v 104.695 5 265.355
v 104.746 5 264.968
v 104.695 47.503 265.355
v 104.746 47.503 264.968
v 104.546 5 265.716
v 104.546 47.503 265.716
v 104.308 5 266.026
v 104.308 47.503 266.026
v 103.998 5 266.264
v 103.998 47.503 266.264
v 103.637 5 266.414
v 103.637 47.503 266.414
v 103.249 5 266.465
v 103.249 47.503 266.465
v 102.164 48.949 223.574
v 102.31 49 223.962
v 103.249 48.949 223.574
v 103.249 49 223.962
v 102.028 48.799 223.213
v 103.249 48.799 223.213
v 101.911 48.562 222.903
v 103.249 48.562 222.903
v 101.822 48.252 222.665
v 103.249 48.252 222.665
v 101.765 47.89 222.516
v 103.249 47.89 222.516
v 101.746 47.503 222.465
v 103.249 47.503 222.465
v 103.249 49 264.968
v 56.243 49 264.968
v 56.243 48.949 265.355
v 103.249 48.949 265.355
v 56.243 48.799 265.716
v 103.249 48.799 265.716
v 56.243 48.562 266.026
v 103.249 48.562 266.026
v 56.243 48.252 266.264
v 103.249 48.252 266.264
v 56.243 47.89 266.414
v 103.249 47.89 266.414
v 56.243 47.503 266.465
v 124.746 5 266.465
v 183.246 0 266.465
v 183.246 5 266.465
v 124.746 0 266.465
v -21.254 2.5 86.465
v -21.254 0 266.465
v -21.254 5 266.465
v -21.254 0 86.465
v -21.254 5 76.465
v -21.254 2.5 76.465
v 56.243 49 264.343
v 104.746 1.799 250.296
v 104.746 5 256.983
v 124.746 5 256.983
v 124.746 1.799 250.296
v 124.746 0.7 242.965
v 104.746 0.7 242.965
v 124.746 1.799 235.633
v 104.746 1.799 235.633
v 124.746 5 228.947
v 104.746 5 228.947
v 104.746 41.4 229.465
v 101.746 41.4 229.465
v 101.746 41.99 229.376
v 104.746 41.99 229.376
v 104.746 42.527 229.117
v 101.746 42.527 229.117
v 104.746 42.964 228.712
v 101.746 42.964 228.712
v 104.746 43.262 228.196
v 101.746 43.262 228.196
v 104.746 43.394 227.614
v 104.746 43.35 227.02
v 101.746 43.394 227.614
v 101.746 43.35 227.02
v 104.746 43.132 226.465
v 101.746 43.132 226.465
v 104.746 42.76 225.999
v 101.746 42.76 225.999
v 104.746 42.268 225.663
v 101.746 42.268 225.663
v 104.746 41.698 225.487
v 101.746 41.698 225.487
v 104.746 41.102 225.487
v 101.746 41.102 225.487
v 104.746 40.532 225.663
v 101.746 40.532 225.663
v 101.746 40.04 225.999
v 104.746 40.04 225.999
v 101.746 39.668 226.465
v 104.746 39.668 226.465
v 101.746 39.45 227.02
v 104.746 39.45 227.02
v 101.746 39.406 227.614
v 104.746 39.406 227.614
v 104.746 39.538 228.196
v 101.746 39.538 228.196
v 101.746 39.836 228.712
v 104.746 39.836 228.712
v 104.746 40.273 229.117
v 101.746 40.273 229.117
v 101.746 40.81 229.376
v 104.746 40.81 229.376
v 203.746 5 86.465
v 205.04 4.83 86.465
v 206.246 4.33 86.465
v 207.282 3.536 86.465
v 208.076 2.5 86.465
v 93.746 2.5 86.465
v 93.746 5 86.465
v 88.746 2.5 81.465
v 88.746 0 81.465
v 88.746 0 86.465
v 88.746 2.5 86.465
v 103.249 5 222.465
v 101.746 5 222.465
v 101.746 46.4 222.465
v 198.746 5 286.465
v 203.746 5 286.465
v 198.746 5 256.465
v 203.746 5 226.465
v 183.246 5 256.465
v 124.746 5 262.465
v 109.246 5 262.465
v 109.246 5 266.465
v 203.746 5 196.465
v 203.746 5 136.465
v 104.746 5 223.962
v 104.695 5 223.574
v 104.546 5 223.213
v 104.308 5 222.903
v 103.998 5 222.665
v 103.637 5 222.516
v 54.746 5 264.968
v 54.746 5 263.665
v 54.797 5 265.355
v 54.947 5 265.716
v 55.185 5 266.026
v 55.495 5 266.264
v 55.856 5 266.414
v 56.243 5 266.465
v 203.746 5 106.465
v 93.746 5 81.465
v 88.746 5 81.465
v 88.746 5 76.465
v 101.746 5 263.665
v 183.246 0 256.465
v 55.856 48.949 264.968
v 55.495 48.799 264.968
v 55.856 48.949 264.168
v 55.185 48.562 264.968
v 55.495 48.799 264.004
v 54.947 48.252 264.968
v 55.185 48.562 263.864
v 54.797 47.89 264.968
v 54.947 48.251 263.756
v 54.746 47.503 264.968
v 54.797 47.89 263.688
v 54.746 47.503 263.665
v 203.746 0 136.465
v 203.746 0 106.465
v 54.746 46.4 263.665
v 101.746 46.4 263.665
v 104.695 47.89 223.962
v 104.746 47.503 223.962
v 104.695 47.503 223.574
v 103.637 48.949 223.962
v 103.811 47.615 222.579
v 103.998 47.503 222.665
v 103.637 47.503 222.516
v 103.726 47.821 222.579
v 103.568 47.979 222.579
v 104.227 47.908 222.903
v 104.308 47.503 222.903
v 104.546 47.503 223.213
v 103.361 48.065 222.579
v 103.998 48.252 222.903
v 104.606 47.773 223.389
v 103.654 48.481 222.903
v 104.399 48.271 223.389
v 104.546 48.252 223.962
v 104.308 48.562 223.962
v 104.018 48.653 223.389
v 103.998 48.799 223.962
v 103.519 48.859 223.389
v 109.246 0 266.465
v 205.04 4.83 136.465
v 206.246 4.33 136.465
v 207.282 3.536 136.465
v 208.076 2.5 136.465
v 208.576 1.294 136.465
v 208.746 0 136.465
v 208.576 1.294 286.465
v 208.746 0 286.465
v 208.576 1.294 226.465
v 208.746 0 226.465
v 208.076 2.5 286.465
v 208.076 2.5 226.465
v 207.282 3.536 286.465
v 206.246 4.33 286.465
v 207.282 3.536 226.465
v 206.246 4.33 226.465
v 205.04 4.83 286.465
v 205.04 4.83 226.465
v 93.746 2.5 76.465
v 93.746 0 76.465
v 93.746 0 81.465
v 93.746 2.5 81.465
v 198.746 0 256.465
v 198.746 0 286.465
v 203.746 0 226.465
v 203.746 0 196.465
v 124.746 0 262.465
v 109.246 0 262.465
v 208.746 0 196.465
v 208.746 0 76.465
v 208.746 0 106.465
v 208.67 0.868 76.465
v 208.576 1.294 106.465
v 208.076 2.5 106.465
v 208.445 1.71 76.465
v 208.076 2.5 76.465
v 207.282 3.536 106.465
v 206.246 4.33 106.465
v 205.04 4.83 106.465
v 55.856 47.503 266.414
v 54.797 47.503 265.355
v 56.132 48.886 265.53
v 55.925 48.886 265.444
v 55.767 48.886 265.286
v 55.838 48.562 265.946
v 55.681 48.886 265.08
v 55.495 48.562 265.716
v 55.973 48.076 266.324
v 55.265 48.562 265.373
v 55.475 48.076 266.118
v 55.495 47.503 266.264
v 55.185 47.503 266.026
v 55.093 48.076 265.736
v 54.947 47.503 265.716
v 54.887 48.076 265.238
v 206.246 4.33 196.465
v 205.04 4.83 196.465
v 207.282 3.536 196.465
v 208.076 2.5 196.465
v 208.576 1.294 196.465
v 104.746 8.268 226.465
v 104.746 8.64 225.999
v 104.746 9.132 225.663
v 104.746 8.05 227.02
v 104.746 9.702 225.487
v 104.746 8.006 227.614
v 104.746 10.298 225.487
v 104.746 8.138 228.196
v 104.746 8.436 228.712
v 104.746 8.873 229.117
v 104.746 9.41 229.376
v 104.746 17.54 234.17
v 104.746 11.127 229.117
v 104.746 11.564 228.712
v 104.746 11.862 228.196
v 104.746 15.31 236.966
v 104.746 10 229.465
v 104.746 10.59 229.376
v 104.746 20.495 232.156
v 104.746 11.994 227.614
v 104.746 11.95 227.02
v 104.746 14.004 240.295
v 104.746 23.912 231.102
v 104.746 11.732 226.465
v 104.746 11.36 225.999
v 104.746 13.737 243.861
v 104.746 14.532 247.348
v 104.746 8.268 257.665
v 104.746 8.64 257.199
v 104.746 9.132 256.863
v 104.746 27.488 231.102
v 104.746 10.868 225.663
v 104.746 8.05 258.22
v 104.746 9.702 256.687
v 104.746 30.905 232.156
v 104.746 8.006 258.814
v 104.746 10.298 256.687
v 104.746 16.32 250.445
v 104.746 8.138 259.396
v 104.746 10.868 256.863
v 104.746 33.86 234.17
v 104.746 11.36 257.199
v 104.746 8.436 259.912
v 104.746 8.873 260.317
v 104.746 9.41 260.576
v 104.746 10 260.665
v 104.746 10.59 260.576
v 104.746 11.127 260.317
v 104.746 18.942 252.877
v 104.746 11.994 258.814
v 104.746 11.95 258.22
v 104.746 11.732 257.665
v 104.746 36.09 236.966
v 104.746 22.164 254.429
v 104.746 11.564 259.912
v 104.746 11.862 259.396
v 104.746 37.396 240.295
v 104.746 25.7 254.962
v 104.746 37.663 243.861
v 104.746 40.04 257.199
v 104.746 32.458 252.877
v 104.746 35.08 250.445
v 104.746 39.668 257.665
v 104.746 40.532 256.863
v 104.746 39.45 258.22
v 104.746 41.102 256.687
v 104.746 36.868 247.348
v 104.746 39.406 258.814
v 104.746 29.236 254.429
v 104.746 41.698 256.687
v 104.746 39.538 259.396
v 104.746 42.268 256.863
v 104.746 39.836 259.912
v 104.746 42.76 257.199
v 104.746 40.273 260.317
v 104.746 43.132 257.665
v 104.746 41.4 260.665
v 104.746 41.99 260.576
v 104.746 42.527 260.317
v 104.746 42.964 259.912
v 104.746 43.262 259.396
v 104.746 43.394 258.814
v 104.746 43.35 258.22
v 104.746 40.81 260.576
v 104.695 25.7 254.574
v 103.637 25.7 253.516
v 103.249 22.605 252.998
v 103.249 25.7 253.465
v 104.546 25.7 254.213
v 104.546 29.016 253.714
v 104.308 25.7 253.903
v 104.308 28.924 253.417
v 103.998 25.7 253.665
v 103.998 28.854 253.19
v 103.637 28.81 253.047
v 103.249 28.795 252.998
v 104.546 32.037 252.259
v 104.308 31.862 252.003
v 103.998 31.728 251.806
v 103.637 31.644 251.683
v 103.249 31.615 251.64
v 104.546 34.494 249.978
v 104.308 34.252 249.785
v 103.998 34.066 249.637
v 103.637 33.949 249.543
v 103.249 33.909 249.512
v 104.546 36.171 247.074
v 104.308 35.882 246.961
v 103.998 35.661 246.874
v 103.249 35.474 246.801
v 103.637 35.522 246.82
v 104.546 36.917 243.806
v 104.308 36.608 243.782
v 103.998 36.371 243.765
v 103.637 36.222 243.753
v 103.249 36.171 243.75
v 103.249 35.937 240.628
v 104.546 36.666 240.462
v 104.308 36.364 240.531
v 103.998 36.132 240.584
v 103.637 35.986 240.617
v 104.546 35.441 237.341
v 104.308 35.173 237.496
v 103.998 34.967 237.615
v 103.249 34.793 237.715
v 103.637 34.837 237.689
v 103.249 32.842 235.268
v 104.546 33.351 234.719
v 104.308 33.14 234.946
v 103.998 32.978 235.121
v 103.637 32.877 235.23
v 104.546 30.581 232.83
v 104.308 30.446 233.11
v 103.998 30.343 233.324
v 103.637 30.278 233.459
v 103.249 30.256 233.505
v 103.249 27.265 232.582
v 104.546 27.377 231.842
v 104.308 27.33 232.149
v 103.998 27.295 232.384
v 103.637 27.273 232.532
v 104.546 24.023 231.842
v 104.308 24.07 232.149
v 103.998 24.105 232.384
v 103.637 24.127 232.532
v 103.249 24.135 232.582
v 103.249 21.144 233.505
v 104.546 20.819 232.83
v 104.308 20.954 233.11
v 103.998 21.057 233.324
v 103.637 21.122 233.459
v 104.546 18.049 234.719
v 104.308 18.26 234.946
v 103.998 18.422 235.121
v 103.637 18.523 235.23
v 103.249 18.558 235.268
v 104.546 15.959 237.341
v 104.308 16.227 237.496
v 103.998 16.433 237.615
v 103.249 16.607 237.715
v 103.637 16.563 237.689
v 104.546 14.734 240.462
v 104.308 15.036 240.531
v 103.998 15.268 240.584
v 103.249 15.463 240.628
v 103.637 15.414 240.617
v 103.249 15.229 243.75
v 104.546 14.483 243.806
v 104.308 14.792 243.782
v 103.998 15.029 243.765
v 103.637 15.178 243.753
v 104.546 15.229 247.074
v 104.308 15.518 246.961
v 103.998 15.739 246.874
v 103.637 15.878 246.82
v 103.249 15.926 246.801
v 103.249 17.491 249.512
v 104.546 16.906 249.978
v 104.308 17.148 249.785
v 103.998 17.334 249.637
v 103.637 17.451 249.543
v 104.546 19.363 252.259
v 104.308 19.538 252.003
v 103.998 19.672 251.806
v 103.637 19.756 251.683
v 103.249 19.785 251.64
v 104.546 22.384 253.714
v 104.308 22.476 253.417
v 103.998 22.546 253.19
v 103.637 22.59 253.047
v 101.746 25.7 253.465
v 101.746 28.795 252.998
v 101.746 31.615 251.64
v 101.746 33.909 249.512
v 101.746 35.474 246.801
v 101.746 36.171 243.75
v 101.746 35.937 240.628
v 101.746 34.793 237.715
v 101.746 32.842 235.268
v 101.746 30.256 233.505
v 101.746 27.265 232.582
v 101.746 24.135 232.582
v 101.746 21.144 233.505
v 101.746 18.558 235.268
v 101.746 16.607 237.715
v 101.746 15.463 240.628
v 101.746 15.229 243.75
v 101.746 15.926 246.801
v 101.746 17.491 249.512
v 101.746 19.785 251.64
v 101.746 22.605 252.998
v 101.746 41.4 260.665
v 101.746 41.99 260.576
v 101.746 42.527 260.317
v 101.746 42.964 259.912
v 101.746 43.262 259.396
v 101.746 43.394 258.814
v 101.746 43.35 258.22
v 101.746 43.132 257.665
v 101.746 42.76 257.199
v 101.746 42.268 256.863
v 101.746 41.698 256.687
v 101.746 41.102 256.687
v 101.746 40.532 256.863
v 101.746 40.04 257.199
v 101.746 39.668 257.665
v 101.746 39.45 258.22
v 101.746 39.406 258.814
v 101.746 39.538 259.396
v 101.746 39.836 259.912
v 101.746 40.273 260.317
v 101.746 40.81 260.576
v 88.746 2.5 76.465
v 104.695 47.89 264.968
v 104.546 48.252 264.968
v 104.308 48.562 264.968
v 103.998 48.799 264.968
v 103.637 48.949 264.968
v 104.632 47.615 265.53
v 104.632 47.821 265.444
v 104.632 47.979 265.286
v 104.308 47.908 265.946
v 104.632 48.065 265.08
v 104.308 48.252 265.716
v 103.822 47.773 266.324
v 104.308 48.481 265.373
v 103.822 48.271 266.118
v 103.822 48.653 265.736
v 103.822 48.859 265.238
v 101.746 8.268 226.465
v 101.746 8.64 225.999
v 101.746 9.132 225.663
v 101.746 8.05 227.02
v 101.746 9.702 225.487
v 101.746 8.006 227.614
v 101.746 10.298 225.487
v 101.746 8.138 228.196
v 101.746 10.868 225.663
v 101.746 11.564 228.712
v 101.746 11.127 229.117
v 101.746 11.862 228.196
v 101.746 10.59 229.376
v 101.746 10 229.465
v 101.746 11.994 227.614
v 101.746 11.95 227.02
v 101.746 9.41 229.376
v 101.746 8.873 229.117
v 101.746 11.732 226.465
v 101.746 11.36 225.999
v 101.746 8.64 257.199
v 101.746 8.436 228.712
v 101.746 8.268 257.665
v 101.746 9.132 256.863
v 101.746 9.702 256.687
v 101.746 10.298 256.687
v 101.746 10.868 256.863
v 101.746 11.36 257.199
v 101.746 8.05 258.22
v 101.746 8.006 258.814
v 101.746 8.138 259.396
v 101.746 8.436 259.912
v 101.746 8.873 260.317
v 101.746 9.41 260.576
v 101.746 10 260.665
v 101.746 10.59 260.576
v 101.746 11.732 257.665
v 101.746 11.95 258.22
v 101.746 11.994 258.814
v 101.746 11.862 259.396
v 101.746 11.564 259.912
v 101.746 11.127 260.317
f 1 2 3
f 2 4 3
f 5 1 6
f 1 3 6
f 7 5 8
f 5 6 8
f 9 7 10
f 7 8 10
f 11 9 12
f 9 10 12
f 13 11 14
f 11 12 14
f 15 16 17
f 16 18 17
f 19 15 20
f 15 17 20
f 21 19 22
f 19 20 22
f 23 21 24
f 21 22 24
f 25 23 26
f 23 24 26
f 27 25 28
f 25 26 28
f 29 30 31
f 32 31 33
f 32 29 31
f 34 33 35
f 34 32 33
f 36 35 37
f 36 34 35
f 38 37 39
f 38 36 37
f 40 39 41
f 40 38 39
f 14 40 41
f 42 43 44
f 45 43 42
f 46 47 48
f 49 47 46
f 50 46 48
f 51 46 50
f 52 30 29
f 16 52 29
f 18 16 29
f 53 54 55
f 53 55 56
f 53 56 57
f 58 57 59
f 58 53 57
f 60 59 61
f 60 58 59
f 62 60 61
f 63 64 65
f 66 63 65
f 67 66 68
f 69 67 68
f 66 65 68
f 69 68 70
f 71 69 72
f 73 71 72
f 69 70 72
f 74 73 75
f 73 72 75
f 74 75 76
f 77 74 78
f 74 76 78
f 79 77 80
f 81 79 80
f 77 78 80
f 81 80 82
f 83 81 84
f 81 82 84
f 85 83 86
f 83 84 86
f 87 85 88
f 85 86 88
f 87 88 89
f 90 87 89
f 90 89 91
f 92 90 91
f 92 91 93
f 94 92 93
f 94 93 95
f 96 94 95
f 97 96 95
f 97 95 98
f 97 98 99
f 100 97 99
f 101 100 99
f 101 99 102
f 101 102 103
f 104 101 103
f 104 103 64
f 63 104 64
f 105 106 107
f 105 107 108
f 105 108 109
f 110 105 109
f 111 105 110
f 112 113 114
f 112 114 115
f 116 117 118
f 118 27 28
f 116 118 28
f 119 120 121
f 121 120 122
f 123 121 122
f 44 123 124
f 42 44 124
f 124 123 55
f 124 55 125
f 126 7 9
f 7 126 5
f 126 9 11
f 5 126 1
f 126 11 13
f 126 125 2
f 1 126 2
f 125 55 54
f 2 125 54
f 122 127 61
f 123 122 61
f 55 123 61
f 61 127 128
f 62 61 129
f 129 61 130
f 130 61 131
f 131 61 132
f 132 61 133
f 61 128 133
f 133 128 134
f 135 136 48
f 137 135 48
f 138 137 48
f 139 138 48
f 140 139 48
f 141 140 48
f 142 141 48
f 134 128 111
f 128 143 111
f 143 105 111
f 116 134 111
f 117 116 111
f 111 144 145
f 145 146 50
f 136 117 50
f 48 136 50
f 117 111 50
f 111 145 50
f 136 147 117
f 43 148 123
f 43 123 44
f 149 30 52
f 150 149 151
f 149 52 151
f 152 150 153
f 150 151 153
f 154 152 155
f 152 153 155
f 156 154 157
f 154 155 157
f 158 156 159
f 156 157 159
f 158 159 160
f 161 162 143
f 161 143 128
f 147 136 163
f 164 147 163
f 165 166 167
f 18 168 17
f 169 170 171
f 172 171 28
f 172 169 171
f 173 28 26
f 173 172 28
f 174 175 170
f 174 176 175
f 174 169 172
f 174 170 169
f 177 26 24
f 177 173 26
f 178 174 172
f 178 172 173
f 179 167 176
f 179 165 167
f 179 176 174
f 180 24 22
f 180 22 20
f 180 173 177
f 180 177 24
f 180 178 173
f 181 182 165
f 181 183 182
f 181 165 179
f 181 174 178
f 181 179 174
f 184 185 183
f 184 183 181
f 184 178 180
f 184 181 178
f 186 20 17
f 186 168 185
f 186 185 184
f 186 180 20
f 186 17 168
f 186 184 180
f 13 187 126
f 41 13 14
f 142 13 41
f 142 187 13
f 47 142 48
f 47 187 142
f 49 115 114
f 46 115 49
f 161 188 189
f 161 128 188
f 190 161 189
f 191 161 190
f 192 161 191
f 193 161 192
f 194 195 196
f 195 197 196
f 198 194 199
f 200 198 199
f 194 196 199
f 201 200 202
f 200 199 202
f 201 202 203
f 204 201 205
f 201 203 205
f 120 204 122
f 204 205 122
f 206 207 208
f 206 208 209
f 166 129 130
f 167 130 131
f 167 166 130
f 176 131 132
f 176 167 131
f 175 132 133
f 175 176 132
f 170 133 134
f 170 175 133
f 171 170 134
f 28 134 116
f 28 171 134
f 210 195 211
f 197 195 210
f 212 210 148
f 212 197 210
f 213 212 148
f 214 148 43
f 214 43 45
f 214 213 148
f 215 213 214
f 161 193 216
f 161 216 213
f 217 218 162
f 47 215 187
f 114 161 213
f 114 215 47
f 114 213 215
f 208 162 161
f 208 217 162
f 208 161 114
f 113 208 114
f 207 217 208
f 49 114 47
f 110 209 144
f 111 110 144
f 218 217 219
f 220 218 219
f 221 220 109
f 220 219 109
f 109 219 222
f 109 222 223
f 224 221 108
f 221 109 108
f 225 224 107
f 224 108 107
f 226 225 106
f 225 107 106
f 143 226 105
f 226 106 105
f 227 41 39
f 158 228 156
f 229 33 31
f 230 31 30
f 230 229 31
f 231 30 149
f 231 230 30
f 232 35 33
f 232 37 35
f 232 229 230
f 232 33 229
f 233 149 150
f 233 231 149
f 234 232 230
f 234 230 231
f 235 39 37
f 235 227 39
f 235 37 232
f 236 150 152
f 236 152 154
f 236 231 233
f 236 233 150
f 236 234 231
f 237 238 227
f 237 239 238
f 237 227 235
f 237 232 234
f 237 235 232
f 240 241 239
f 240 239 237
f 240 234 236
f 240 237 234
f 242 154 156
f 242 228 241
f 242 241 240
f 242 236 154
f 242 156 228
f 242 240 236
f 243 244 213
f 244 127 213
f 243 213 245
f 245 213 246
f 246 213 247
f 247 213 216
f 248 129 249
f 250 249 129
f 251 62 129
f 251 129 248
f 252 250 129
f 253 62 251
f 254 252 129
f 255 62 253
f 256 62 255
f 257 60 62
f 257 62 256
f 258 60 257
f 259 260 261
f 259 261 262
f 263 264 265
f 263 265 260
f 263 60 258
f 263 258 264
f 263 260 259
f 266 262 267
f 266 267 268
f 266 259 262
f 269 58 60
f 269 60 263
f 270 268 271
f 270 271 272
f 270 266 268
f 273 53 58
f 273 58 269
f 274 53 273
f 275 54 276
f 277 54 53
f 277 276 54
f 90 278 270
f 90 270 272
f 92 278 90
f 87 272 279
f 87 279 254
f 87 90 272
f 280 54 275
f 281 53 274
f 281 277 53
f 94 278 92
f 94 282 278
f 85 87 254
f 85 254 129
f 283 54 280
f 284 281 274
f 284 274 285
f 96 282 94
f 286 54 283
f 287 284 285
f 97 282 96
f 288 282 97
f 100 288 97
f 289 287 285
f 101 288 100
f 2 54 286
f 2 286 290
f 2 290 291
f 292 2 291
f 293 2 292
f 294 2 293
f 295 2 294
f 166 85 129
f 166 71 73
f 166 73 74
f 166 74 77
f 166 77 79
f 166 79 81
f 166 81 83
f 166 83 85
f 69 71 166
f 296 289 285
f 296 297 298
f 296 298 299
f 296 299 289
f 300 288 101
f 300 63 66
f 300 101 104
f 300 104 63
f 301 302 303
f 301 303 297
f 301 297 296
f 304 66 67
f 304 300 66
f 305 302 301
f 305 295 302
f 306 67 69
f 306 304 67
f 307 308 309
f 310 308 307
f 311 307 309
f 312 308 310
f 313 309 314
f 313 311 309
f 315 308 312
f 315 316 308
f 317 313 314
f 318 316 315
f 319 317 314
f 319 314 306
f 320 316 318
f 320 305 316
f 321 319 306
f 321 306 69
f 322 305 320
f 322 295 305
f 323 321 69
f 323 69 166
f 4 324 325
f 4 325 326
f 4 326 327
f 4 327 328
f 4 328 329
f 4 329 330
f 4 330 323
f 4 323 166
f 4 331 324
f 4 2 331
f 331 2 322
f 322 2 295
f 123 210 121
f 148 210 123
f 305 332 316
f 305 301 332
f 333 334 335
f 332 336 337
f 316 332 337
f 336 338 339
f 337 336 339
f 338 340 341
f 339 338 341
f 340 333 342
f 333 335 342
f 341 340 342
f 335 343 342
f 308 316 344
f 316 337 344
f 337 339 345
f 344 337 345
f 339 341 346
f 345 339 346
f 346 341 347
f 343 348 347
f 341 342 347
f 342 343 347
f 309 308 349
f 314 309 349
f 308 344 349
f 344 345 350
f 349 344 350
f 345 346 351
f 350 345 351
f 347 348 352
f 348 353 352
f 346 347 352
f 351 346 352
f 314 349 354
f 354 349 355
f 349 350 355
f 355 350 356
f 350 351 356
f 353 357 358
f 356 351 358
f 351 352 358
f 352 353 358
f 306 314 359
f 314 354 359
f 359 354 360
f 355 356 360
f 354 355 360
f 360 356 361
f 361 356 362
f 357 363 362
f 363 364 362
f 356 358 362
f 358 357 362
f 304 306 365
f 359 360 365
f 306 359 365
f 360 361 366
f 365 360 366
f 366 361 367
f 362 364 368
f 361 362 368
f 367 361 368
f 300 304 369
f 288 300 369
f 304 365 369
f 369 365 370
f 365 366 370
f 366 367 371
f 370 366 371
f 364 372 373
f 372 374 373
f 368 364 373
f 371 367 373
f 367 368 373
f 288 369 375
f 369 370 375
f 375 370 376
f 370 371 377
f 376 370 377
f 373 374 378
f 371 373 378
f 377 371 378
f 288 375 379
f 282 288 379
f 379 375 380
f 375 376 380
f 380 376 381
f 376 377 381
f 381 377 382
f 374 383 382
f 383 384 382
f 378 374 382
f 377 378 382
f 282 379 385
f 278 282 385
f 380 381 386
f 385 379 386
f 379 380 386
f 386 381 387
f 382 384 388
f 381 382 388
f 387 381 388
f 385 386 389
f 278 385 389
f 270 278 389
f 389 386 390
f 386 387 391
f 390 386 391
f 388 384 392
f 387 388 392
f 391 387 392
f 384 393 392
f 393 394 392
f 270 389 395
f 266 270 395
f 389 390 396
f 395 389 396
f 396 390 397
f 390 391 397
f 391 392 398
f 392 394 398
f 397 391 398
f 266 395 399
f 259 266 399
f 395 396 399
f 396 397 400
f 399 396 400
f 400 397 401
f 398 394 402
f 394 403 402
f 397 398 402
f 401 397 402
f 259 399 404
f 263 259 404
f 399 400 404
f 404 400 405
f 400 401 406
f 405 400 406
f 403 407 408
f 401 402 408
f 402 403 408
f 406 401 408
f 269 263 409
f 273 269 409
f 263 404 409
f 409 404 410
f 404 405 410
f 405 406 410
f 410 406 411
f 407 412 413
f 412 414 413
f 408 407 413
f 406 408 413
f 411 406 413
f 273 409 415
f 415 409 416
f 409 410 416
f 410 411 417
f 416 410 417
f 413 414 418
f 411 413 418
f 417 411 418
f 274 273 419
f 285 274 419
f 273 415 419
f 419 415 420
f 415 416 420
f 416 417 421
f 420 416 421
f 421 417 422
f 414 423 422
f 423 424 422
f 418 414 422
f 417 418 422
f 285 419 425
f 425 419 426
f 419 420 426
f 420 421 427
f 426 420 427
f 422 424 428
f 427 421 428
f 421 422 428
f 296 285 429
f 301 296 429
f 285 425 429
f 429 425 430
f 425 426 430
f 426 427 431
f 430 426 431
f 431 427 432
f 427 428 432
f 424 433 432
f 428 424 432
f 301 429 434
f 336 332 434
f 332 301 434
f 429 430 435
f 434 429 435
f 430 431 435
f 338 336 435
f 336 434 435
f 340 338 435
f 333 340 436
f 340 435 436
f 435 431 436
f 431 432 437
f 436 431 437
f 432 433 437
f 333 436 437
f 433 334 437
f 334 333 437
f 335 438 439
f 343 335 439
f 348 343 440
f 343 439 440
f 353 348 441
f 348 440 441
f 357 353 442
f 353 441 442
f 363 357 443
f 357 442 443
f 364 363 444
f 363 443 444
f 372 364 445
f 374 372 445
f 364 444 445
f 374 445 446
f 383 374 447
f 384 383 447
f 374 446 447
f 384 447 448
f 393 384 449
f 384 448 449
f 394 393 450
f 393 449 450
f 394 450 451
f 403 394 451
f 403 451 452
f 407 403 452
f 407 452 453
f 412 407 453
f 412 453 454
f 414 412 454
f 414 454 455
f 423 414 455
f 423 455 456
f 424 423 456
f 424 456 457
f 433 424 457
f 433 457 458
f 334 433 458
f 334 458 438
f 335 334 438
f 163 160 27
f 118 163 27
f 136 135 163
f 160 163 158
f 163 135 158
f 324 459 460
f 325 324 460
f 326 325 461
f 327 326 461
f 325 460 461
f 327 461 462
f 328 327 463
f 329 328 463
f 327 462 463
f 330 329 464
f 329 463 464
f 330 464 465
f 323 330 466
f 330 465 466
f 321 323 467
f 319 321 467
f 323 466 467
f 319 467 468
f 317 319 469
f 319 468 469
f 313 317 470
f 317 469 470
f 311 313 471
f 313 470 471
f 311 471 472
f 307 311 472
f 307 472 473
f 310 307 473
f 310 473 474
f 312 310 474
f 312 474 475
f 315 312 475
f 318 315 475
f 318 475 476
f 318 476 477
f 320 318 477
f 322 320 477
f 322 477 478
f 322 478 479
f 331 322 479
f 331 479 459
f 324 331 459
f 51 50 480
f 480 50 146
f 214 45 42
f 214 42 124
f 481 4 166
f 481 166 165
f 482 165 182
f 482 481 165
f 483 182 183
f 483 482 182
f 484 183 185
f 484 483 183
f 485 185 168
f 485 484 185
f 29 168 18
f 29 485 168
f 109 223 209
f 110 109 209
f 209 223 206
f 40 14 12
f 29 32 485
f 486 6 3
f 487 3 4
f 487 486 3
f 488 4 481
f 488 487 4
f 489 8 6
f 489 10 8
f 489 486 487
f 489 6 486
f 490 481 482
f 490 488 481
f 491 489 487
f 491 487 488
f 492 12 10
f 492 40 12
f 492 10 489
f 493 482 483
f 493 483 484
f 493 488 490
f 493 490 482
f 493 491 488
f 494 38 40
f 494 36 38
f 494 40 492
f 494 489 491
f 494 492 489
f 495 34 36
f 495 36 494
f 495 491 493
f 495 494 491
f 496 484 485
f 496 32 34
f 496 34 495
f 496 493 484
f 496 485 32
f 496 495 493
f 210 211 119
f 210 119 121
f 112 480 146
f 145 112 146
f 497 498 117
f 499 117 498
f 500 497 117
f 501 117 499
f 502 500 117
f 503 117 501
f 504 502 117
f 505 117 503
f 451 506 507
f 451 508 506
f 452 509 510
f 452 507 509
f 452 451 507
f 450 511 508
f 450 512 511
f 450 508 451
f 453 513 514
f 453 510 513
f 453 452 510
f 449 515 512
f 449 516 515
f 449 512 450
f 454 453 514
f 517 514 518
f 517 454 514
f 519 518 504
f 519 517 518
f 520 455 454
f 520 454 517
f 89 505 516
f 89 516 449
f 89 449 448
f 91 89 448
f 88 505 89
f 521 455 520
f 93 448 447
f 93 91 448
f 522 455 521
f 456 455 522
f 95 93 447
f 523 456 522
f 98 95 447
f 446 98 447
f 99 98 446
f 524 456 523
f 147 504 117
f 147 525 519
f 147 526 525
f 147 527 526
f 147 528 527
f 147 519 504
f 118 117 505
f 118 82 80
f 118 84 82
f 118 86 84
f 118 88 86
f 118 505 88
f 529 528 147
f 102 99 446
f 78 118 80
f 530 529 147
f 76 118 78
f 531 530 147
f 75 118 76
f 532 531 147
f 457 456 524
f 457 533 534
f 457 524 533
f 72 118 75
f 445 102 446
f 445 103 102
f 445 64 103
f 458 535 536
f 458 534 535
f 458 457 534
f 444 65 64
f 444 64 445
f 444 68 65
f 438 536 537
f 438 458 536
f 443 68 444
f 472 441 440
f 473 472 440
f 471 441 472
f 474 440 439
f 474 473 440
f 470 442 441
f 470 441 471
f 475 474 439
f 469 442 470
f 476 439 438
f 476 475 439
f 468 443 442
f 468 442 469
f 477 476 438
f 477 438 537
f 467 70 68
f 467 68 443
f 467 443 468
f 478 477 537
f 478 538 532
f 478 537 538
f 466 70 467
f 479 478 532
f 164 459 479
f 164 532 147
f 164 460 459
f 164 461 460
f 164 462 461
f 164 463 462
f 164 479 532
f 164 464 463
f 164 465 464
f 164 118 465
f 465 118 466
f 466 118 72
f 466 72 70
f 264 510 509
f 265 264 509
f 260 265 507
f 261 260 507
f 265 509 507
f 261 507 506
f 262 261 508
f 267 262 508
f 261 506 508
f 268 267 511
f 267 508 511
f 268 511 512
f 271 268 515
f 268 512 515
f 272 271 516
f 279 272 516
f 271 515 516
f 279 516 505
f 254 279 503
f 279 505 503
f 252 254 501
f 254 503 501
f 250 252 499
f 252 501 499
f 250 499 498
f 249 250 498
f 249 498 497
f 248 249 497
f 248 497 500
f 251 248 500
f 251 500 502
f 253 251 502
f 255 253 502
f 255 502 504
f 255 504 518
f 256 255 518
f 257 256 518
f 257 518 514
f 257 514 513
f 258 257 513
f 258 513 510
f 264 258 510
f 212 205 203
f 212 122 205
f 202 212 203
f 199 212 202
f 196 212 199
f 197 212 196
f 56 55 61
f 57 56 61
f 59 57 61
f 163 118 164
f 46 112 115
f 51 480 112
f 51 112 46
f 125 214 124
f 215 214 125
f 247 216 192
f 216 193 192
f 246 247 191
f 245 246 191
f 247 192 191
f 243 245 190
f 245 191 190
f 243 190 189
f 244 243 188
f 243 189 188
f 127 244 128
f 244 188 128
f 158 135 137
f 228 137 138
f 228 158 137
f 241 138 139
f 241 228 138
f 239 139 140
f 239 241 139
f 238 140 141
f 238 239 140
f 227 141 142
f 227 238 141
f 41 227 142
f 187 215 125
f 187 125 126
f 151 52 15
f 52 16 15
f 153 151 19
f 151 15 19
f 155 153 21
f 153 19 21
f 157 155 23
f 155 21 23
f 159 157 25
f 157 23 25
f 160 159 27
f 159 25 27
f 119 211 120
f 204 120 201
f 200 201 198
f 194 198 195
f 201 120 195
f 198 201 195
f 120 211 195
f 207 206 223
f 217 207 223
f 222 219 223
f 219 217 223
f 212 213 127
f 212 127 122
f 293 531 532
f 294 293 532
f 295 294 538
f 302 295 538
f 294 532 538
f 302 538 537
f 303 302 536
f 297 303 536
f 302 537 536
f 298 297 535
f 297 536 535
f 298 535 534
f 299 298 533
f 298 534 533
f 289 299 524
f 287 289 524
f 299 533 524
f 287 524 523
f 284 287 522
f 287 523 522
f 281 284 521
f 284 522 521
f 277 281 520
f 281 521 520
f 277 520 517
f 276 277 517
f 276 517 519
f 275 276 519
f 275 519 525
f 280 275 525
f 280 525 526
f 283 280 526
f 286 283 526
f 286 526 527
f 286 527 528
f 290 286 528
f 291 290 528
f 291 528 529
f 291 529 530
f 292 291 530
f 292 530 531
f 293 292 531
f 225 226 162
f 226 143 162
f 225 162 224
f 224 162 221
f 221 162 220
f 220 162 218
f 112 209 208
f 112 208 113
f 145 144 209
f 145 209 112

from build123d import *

# Parameters (mm, degrees)
SKETCH_1_W          = 5
SKETCH_1_H          = 60
SKETCH_1_W_2        = 30
SKETCH_1_H_2        = 5
SKETCH_1_W_3        = 15
EXTRUDE_1_DEPTH     = 5
FILLET_1_R          = 5
SKETCH_2_W          = 245
SKETCH_2_H          = 125
CUT_EXTRUDE_1_DEPTH = 5
SKETCH_3_W          = 110
SKETCH_3_H          = 2.5
SKETCH_3_W_2        = 115
CUT_EXTRUDE_2_DEPTH = 10
SKETCH_4_W          = 5
SKETCH_4_H          = 5
CUT_EXTRUDE_3_DEPTH = 5
SKETCH_5_W          = 50
SKETCH_5_H          = 44
EXTRUDE_2_DEPTH     = 47
SKETCH_6_W          = 41.4
SKETCH_6_H          = 41.4
CUT_EXTRUDE_4_DEPTH = 47
SKETCH_7_R          = 10.5
CUT_EXTRUDE_5_DEPTH = 316.582224557
CUT_EXTRUDE_6_DEPTH = 44
SKETCH_10_R         = 2
CUT_EXTRUDE_7_DEPTH = 316.582224557
SKETCH_13_R         = 25
CUT_EXTRUDE_9_DEPTH = 20
FILLET_11_R         = 1.497


with BuildPart() as part:
    # 草圖1 → 填料-伸長1 (new body)
    with BuildSketch(Plane(origin=(0, 0, 0), x_dir=(1, 0, 0), z_dir=(0, 1, 0))):
        Polygon((198.746286718, -286.464902661), (198.746286718, -256.464902661), (183.246286718, -256.464902661), (183.246286718, -266.464902661), (124.746286718, -266.464902661), (124.746286718, -262.464902661), (109.246286718, -262.464902661), (109.246286718, -266.464902661), (-21.253713282, -266.464902661), (-21.253713282, 38.535097339), (-36.253713282, 38.535097339), (-36.253713282, 43.535097339), (203.746286718, 43.535097339), (203.746286718, -286.464902661), align=None)
        with Locations((206.246286718, -256.464902661)):
            Rectangle(SKETCH_1_W, SKETCH_1_H)
        with Locations((206.246286718, 13.535097339)):
            Rectangle(SKETCH_1_W, SKETCH_1_H)
        with Locations((188.746286718, 46.035097339)):
            Rectangle(SKETCH_1_W_2, SKETCH_1_H_2)
        with Locations((-21.253713282, 46.035097339)):
            Rectangle(SKETCH_1_W_2, SKETCH_1_H_2)
        with Locations((91.246286718, 46.035097339)):
            Rectangle(SKETCH_1_W_3, SKETCH_1_H_2)
        with Locations((76.246286718, 46.035097339)):
            Rectangle(SKETCH_1_W_3, SKETCH_1_H_2)
        with Locations((206.246286718, -166.464902661)):
            Rectangle(SKETCH_1_W, SKETCH_1_H)
        with Locations((206.246286718, -76.464902661)):
            Rectangle(SKETCH_1_W, SKETCH_1_H)
    extrude(amount=EXTRUDE_1_DEPTH)

    # 圓角1
    fillet_1_edges = [part.edges().sort_by_distance(p)[0] for p in [
        (208.746286718, 5, -13.535097339),
        (208.746286718, 5, 76.464902661),
        (208.746286718, 5, 166.464902661),
        (208.746286718, 5, 256.464902661),
    ]]
    fillet(fillet_1_edges, radius=FILLET_1_R - 0.0001)  # a hair under: the kernel refuses the full size

    # 草圖2 → 除料-伸長1 (cut)
    with BuildSketch(Plane(origin=(0, 5, 0), x_dir=(1, 0, 0), z_dir=(0, 1, 0))):
        with Locations((86.246286718, -13.964902661)):
            Rectangle(SKETCH_2_W, SKETCH_2_H)
    extrude(amount=-CUT_EXTRUDE_1_DEPTH, mode=Mode.SUBTRACT)

    # 草圖3 → 除料-伸長2 (cut)
    with BuildSketch(Plane(origin=(0, 0, 76.464902661), x_dir=(-1, 0, 0), z_dir=(0, 0, -1))):
        with Locations((-33.746286718, 1.25)):
            Rectangle(SKETCH_3_W, SKETCH_3_H)
        with Locations((-151.246286718, 3.75)):
            Rectangle(SKETCH_3_W_2, SKETCH_3_H)
    extrude(amount=-CUT_EXTRUDE_2_DEPTH, mode=Mode.SUBTRACT)

    # 草圖4 → 除料-伸長3 (cut)
    with BuildSketch(Plane(origin=(0, 0, 76.464902661), x_dir=(-1, 0, 0), z_dir=(0, 0, -1))):
        with Locations((-91.246286718, 2.5)):
            Rectangle(SKETCH_4_W, SKETCH_4_H)
    extrude(amount=-CUT_EXTRUDE_3_DEPTH, mode=Mode.SUBTRACT)

    # 草圖5 → 填料-伸長2 (add)
    with BuildSketch(Plane.XY.offset(266.464902661)):
        with Locations((79.746286718, 27)):
            Rectangle(SKETCH_5_W, SKETCH_5_H)
    extrude(amount=-EXTRUDE_2_DEPTH)

    # 草圖6 → 除料-伸長4 (cut)
    with BuildSketch(Plane.ZY.offset(-54.746286718)):
        with Locations((242.964902661, 25.7)):
            Rectangle(SKETCH_6_W, SKETCH_6_H)
    extrude(amount=-CUT_EXTRUDE_4_DEPTH, mode=Mode.SUBTRACT)

    # 草圖7 → 除料-伸長5 (cut, through all)
    with BuildSketch(Plane.ZY.offset(-101.746286718)):
        with Locations((242.964902661, 25.7)):
            Circle(SKETCH_7_R)
    extrude(amount=-CUT_EXTRUDE_5_DEPTH, mode=Mode.SUBTRACT)

    # 草圖8 → 除料-伸長6 (cut)
    with BuildSketch(Plane(origin=(0, 49, 0), x_dir=(1, 0, 0), z_dir=(0, 1, 0))):
        Polygon((54.746286718, -263.664902661), (101.746286718, -222.464902661), (104.746286718, -222.464902661), (104.746286718, -219.464902661), (54.746286718, -219.464902661), align=None)
    extrude(amount=-CUT_EXTRUDE_6_DEPTH, mode=Mode.SUBTRACT)

    # 草圖10 → 除料-伸長7 (cut, through all)
    with BuildSketch(Plane.ZY.offset(-101.746286718)):
        with Locations((227.464902661, 41.4)):
            Circle(SKETCH_10_R)
        with Locations((258.664902661, 41.4)):
            Circle(SKETCH_10_R)
        with Locations((258.664902661, 10)):
            Circle(SKETCH_10_R)
        with Locations((227.464902661, 10)):
            Circle(SKETCH_10_R)
    extrude(amount=-CUT_EXTRUDE_7_DEPTH, mode=Mode.SUBTRACT)

    # 草圖13 → 除料-伸長9 (cut)
    with BuildSketch(Plane(origin=(104.746286718, 0, 0), x_dir=(0, 0, -1), z_dir=(1, 0, 0))):
        with Locations((-242.964902661, 25.7)):
            Circle(SKETCH_13_R)
    extrude(amount=CUT_EXTRUDE_9_DEPTH, mode=Mode.SUBTRACT)

    # 圓角11
    fillet_11_edges = [part.edges().sort_by_distance(p)[0] for p in [
        (54.746286718, 27, 266.464902661),
        (79.746286718, 49, 266.464902661),
        (104.746286718, 27, 266.464902661),
        (104.746286718, 25.7, 232.464902661),
        (54.746286718, 49, 265.064902661),
        (104.746286718, 49, 244.464902661),
        (104.746286718, 27, 222.464902661),
        (78.246286718, 49, 243.064902661),
        (103.246286718, 49, 222.464902661),
    ]]
    fillet(fillet_11_edges, radius=FILLET_11_R)


solid = part.part
